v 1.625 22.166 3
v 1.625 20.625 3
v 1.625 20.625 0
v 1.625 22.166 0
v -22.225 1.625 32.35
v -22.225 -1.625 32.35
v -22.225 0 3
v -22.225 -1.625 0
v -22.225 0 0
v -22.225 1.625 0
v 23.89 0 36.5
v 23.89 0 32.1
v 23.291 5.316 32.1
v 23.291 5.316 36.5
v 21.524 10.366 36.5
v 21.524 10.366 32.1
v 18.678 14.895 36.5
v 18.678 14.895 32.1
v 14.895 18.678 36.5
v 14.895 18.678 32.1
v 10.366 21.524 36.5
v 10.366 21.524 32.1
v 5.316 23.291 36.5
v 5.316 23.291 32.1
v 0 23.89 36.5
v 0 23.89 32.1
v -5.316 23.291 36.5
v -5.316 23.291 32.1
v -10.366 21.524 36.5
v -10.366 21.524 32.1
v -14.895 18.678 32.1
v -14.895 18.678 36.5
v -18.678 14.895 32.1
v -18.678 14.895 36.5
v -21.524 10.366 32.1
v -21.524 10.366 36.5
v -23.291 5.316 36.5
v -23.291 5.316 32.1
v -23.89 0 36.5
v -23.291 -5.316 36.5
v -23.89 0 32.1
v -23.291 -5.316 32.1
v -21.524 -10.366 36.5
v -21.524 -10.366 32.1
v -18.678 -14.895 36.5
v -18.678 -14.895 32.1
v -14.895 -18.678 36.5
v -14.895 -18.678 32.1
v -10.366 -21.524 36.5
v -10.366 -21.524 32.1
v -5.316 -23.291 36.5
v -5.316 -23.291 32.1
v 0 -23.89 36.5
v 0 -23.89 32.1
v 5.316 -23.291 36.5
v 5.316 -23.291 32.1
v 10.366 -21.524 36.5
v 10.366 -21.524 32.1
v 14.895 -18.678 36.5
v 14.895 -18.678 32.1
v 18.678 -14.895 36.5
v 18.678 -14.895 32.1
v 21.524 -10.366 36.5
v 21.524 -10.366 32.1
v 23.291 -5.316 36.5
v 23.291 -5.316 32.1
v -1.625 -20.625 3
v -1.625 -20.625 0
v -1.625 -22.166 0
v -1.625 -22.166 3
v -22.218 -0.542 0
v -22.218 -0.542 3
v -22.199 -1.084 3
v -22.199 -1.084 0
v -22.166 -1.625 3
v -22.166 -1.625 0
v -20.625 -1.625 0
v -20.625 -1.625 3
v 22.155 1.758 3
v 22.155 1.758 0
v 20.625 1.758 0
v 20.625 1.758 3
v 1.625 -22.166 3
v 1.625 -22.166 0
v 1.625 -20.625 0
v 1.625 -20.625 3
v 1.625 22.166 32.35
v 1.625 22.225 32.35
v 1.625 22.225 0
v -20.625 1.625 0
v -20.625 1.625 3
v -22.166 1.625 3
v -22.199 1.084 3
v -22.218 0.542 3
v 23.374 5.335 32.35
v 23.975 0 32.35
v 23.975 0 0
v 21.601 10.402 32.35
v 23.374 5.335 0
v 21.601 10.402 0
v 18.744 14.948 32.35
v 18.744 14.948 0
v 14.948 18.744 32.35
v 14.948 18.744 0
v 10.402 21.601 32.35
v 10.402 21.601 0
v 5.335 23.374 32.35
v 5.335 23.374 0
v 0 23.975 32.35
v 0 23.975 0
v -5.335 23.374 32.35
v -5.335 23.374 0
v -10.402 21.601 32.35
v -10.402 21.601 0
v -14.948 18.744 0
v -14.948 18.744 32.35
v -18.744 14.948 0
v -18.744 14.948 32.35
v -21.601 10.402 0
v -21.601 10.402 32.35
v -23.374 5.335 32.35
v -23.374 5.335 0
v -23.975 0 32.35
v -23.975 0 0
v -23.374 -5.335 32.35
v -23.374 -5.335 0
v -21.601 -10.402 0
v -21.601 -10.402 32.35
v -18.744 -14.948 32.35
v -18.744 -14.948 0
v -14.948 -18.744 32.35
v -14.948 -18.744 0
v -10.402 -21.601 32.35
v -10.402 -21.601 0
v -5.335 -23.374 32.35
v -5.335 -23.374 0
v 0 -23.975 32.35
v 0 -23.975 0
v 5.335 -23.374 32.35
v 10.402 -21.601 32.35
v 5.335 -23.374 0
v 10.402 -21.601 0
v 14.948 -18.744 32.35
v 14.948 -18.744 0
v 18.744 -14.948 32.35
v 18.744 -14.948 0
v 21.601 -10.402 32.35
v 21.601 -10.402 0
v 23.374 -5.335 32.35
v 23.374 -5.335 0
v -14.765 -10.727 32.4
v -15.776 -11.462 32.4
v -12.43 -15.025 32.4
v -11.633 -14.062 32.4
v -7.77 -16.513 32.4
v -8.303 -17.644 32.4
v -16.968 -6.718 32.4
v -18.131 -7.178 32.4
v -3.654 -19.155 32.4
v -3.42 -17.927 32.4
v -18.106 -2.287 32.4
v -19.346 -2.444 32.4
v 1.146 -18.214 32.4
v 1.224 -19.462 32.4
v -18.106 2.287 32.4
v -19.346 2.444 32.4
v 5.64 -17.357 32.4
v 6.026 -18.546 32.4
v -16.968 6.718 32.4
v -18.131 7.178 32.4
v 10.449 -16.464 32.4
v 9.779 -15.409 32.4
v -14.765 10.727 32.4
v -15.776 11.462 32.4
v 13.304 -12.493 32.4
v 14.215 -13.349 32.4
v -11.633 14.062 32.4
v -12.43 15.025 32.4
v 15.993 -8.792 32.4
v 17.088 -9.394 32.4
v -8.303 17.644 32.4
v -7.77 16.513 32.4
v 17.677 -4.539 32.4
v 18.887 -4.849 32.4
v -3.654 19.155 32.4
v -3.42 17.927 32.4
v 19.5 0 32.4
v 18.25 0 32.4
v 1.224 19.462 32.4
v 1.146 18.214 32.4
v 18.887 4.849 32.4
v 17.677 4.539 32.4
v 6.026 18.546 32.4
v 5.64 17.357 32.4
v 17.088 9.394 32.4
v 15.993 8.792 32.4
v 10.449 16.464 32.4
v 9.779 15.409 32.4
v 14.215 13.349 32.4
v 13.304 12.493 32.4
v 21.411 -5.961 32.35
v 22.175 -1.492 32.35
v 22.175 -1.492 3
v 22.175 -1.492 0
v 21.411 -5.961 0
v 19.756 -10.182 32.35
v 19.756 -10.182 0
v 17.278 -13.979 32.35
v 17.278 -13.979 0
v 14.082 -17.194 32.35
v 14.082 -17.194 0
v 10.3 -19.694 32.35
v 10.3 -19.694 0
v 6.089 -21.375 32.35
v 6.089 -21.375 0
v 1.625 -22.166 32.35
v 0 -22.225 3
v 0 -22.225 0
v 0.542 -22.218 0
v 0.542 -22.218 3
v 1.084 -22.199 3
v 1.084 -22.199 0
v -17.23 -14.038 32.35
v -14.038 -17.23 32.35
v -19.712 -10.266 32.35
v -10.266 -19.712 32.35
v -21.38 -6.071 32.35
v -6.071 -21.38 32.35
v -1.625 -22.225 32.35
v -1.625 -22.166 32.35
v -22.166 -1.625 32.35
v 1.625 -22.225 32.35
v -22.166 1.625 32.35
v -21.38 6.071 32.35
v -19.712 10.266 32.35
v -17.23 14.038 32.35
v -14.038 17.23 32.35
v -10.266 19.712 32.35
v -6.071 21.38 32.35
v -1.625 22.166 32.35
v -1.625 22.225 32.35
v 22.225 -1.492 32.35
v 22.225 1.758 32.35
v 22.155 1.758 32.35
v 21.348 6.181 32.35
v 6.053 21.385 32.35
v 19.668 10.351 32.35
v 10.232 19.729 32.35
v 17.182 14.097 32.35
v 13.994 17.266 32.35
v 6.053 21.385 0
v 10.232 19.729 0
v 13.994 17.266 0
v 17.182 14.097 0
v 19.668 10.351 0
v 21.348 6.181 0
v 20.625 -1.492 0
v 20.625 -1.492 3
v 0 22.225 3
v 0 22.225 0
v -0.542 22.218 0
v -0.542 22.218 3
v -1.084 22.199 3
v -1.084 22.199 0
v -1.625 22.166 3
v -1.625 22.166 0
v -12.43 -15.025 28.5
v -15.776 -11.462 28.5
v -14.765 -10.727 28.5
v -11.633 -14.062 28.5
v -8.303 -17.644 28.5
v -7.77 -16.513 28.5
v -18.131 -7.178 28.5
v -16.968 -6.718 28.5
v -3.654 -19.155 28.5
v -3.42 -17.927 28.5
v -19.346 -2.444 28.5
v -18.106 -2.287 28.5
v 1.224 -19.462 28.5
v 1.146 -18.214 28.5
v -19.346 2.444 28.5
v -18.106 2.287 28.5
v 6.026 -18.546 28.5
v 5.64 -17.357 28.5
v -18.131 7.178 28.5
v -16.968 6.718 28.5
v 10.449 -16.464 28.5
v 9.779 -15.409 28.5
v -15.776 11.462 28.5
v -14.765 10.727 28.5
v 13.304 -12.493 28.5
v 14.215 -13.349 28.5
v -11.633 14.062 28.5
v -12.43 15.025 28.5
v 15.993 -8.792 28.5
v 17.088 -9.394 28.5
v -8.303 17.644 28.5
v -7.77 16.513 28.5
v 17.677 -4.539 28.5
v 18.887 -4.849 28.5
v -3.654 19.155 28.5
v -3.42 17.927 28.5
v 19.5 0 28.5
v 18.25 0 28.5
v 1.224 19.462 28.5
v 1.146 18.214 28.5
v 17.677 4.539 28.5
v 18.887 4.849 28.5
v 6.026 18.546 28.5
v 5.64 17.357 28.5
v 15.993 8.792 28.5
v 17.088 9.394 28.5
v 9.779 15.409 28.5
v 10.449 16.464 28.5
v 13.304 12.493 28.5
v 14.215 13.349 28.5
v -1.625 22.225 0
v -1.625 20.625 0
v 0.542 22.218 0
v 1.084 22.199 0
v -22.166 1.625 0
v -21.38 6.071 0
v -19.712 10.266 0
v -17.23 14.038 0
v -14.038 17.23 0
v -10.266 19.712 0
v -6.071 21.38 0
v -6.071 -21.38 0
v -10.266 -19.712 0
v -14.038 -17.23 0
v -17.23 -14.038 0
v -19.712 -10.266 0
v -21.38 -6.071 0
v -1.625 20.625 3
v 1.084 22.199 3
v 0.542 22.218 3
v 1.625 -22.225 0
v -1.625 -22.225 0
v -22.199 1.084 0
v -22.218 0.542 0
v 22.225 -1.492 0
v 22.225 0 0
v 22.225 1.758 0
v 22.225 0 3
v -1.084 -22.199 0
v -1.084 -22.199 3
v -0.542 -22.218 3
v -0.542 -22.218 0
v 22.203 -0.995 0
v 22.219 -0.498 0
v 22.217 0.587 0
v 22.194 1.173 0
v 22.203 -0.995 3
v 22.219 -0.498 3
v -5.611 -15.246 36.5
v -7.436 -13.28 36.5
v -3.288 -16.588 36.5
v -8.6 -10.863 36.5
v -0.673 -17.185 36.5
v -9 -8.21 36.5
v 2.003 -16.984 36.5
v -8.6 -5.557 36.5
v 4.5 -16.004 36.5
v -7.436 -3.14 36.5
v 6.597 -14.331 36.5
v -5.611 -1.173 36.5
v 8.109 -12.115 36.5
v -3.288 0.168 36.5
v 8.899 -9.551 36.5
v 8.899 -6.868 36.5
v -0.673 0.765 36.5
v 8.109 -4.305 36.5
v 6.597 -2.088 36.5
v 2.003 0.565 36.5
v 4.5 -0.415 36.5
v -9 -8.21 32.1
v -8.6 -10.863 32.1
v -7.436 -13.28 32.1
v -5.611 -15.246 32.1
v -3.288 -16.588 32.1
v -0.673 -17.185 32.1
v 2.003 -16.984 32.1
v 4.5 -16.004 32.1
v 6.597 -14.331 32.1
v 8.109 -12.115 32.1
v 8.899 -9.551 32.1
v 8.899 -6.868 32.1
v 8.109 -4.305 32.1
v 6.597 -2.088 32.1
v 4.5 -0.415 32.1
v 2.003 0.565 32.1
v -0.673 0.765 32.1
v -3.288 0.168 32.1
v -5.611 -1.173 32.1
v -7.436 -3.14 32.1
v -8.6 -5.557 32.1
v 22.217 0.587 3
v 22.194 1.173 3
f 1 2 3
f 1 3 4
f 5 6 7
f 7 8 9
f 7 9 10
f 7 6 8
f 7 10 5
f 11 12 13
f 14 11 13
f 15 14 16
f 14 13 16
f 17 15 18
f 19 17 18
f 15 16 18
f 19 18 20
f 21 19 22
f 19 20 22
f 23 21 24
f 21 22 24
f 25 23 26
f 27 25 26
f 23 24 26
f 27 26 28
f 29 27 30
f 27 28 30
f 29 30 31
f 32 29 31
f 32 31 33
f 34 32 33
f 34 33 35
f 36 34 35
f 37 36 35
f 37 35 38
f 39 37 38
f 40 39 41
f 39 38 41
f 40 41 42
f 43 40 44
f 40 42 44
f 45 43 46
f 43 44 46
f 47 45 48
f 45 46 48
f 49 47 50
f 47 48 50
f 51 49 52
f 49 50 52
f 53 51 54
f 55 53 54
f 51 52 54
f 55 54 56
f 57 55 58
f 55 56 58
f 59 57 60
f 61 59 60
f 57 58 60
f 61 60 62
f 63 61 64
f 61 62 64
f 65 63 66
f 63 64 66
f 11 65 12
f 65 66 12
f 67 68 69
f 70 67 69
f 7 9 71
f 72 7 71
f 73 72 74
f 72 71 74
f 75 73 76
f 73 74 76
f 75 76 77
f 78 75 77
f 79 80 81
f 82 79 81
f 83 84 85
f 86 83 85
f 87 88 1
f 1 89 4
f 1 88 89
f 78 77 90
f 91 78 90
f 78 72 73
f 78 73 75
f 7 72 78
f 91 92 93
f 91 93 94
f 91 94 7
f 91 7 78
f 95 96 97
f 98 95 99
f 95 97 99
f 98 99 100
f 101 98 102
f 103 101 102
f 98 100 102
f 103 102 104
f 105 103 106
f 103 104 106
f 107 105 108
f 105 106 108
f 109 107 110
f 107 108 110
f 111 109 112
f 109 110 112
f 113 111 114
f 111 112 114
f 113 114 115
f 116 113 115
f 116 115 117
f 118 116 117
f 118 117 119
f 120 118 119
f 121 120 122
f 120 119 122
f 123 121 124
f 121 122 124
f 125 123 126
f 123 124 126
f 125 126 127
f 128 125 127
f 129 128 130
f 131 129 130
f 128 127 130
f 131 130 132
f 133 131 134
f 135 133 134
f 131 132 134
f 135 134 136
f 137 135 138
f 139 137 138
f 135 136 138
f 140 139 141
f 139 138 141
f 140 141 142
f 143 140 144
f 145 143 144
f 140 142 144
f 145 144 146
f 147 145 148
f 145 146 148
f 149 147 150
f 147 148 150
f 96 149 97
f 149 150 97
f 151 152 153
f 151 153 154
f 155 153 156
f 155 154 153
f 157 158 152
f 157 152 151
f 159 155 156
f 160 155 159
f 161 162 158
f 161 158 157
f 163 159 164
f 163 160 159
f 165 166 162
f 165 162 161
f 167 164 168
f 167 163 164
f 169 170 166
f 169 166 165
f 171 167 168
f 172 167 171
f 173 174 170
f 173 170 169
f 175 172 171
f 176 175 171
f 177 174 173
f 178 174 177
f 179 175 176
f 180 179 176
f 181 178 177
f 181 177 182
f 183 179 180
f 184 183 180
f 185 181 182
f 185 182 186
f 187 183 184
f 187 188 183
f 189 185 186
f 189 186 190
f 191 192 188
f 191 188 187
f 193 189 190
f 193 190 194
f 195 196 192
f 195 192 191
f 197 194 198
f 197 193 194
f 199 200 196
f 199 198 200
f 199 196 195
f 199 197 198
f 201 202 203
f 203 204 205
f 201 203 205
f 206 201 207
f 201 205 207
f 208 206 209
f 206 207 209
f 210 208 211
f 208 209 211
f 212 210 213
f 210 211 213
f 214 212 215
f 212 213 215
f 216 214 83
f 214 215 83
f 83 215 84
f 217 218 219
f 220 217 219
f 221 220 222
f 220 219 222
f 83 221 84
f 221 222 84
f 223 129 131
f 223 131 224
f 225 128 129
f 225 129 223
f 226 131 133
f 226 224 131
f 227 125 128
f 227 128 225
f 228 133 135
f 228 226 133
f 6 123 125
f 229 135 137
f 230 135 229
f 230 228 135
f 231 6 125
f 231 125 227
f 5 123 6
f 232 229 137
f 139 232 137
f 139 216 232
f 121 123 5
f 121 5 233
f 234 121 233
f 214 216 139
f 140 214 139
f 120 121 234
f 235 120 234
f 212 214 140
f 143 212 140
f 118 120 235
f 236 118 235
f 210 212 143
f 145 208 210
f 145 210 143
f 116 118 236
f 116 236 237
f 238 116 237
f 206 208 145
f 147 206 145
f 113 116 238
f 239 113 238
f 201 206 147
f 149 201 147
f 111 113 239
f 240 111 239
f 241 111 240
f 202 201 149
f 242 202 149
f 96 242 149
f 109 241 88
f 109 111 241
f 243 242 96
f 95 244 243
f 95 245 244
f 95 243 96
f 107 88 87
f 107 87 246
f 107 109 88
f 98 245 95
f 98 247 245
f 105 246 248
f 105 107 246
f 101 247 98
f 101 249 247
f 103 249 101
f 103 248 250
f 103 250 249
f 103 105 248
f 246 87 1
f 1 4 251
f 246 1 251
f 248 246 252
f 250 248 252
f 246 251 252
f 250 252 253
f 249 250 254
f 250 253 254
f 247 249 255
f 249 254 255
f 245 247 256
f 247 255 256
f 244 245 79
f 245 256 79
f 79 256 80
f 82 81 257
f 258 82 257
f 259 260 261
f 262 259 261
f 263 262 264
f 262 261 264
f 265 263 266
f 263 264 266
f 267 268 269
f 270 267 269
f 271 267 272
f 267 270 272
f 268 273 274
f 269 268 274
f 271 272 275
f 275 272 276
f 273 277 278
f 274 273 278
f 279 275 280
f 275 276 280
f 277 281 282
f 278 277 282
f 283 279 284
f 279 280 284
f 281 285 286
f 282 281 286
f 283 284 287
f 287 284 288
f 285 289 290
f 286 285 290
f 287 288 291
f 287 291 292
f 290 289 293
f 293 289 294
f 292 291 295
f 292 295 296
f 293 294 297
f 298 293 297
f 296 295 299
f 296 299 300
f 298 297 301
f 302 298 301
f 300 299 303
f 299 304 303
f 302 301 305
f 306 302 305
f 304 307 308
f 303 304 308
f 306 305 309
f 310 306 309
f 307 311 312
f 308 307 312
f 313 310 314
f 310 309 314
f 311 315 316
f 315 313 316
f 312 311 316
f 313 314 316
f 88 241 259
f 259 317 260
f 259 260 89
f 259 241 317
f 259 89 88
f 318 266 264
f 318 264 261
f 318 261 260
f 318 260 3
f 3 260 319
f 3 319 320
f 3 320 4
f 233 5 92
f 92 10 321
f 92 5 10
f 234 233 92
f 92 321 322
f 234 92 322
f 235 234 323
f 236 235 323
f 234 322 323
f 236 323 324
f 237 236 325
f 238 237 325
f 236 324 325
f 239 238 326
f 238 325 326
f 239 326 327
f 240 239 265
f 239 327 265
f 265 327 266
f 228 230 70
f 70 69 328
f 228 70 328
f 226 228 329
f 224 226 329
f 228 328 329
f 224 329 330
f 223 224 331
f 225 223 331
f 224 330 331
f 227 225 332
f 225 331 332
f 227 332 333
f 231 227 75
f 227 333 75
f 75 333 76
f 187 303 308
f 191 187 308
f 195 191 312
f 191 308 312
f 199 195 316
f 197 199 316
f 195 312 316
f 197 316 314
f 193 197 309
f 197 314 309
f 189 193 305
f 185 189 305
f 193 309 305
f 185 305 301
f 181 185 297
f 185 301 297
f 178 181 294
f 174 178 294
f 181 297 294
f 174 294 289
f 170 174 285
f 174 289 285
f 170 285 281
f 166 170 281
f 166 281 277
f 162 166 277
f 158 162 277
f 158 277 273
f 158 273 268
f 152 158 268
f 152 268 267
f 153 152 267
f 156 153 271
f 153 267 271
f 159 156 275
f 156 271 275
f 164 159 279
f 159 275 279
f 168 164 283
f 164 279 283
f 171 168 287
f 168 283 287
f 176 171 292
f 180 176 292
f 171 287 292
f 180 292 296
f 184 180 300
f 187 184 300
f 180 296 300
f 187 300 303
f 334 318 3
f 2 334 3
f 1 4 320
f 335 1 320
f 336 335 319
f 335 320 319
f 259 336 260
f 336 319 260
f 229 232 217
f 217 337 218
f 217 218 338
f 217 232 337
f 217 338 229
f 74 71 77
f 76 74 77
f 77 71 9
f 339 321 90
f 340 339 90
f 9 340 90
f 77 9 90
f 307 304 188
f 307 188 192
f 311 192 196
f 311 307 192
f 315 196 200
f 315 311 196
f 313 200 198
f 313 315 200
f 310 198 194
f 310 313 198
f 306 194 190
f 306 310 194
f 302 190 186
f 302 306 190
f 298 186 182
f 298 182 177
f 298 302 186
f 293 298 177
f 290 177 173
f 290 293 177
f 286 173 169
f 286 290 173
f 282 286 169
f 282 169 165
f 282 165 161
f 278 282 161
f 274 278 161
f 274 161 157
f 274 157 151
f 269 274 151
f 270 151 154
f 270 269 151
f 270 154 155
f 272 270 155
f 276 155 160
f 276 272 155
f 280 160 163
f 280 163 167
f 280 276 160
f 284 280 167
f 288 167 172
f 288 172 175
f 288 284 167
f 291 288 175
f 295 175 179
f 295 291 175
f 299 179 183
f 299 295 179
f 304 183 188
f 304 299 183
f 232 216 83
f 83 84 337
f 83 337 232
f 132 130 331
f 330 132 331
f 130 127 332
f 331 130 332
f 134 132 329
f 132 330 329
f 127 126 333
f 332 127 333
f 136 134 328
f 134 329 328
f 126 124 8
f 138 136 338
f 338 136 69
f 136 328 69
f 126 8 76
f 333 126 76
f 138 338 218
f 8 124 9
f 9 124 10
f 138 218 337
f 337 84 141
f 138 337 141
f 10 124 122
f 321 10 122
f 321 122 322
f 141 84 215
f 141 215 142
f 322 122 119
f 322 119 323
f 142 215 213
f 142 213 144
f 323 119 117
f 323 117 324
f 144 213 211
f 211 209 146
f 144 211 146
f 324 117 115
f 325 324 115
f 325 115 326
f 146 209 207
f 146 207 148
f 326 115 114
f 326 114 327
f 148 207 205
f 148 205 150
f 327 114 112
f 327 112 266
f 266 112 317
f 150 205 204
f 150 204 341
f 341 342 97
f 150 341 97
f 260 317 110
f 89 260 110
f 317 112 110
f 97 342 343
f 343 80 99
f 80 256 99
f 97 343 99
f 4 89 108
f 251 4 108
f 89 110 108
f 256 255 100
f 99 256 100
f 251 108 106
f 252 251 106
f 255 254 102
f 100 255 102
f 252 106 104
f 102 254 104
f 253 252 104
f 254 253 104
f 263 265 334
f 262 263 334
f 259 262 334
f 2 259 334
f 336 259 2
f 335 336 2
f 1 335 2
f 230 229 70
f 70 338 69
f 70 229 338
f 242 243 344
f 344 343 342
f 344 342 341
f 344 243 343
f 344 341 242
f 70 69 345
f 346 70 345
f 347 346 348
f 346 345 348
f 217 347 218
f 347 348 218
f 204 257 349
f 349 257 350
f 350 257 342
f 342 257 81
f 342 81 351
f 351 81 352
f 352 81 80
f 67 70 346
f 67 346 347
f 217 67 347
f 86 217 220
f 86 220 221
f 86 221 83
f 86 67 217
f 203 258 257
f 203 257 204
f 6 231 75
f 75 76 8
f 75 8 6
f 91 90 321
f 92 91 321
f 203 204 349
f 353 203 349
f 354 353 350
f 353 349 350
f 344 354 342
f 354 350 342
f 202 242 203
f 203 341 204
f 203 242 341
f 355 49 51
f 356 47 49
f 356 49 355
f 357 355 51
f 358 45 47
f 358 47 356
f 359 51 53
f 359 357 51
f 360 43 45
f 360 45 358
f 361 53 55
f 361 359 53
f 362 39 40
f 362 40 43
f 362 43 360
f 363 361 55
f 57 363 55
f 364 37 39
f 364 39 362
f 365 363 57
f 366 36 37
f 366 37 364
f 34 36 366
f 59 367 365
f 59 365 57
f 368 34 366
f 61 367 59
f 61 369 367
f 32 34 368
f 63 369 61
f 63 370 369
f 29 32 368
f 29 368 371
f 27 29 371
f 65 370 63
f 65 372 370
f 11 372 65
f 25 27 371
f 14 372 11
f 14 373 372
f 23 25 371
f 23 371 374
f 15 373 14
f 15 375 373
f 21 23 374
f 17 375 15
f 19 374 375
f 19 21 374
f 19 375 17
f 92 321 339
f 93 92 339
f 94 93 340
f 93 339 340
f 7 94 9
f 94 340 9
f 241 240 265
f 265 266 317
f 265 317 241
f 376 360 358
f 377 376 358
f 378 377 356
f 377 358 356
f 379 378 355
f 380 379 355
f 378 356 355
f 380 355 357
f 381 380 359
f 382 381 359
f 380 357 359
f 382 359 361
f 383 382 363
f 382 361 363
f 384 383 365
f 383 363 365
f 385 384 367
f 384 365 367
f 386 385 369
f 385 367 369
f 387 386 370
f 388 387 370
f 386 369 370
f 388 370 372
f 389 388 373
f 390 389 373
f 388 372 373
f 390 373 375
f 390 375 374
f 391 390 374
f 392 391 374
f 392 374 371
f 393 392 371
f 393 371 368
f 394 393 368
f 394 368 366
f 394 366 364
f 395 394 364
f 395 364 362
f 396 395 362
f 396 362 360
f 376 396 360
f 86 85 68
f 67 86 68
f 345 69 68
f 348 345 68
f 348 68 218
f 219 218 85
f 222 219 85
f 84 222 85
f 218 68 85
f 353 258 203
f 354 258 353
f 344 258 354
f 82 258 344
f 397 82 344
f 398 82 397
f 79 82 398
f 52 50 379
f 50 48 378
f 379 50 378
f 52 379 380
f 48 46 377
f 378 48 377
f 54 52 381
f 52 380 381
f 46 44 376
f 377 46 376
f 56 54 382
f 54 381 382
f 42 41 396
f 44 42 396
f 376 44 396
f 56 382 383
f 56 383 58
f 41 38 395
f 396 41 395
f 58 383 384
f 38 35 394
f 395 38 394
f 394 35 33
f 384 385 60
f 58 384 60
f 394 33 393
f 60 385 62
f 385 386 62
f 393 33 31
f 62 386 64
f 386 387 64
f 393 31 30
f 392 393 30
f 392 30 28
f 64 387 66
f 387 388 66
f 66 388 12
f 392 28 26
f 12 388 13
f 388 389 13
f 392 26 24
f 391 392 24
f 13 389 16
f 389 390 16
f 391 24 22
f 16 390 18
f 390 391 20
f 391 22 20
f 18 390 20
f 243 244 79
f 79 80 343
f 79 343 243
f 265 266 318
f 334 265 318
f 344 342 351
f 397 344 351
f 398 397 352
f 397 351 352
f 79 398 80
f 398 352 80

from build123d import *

# Parameters (mm, degrees)
F0_R     = 23.975
F1_DEPTH = 32.35
F2_DEPTH = 3
F3_START = 28.5
F0_R_2   = 19.5
F0_R_3   = 18.25
F3_DEPTH = 3.9
F5_START = 32.1
F4_R     = 23.8900958131
F5_DEPTH = 4.4
F7_D     = 18


with BuildPart() as f1:
    # F0 (on Top) → F1 (new body)
    with BuildSketch(Plane.XY):
        Circle(F0_R)
        with BuildLine():
            Line((22.225, 1.7580471948), (22.225, 0))
            Line((22.225, 0), (22.225, -1.4919528052))
            Line((22.225, -1.4919528052), (22.1748664444, -1.4919528052))
            ThreePointArc((22.1748664444, -1.4919528052), (15.7625328318, -15.6682220984), (1.625, -22.1655137545))
            Line((1.625, -22.1655137545), (1.625, -22.225))
            Line((1.625, -22.225), (0, -22.225))
            Line((0, -22.225), (-1.625, -22.225))
            Line((-1.625, -22.225), (-1.625, -22.1655137545))
            ThreePointArc((-1.625, -22.1655137545), (-15.7154482119, -15.7154482119), (-22.1655137545, -1.625))
            Line((-22.1655137545, -1.625), (-22.225, -1.625))
            Line((-22.225, -1.625), (-22.225, 0))
            Line((-22.225, 0), (-22.225, 1.625))
            Line((-22.225, 1.625), (-22.1655137545, 1.625))
            ThreePointArc((-22.1655137545, 1.625), (-15.7154482119, 15.7154482119), (-1.625, 22.1655137545))
            Line((-1.625, 22.1655137545), (-1.625, 22.225))
            Line((-1.625, 22.225), (0, 22.225))
            Line((0, 22.225), (1.625, 22.225))
            Line((1.625, 22.225), (1.625, 22.1655137545))
            ThreePointArc((1.625, 22.1655137545), (15.6682012804, 15.7625535253), (22.1553581569, 1.7580471948))
            Line((22.1553581569, 1.7580471948), (22.225, 1.7580471948))
        make_face(mode=Mode.SUBTRACT)
    extrude(amount=F1_DEPTH)

    # F0 (on Top) → F2 (join)
    with BuildSketch(Plane.XY):
        with BuildLine():
            Line((1.625, 20.625), (1.625, 22.1655137545))
            ThreePointArc((1.625, 22.1655137545), (0.8130442198, 22.2101234597), (0, 22.225))
            ThreePointArc((0, 22.225), (-0.8130442198, 22.2101234597), (-1.625, 22.1655137545))
            Line((-1.625, 22.1655137545), (-1.625, 20.625))
            Line((-1.625, 20.625), (1.625, 20.625))
        make_face()
        with BuildLine():
            ThreePointArc((22.1748664444, -1.4919528052), (22.2124630751, -0.7463974387), (22.225, 0))
            ThreePointArc((22.225, 0), (22.2075827144, 0.8797130108), (22.1553581569, 1.7580471948))
            Line((22.1553581569, 1.7580471948), (20.625, 1.7580471948))
            Line((20.625, 1.7580471948), (20.625, -1.4919528052))
            Line((20.625, -1.4919528052), (22.1748664444, -1.4919528052))
        make_face()
        with BuildLine():
            ThreePointArc((0, -22.225), (0.8130442198, -22.2101234597), (1.625, -22.1655137545))
            Line((1.625, -22.1655137545), (1.625, -20.625))
            Line((1.625, -20.625), (-1.625, -20.625))
            Line((-1.625, -20.625), (-1.625, -22.1655137545))
            ThreePointArc((-1.625, -22.1655137545), (-0.8130442198, -22.2101234597), (0, -22.225))
        make_face()
        with BuildLine():
            Line((-20.625, 1.625), (-22.1655137545, 1.625))
            ThreePointArc((-22.1655137545, 1.625), (-22.2101234597, 0.8130442198), (-22.225, 0))
            ThreePointArc((-22.225, 0), (-22.2101234597, -0.8130442198), (-22.1655137545, -1.625))
            Line((-22.1655137545, -1.625), (-20.625, -1.625))
            Line((-20.625, -1.625), (-20.625, 1.625))
        make_face()
    extrude(amount=F2_DEPTH)


with BuildPart() as f3:
    # F0 (on Top) → F3 (new body)
    with BuildSketch(Plane.XY.offset(F3_START)):
        Circle(F0_R_2)
        Circle(F0_R_3, mode=Mode.SUBTRACT)
    extrude(amount=F3_DEPTH)


with BuildPart() as f5:
    # F4 (on Top) → F5 (new body)
    with BuildSketch(Plane.XY.offset(F5_START)):
        Circle(F4_R)
    extrude(amount=F5_DEPTH)

    # F7 (through all)
    with Locations(Plane(origin=(0, 0, 0), x_dir=(1, 0, 0), z_dir=(0, 0, -1))):
        with Locations((0, 8.2097251497)):
            Hole(F7_D / 2)


solid = Compound([f1.part, f3.part, f5.part])
